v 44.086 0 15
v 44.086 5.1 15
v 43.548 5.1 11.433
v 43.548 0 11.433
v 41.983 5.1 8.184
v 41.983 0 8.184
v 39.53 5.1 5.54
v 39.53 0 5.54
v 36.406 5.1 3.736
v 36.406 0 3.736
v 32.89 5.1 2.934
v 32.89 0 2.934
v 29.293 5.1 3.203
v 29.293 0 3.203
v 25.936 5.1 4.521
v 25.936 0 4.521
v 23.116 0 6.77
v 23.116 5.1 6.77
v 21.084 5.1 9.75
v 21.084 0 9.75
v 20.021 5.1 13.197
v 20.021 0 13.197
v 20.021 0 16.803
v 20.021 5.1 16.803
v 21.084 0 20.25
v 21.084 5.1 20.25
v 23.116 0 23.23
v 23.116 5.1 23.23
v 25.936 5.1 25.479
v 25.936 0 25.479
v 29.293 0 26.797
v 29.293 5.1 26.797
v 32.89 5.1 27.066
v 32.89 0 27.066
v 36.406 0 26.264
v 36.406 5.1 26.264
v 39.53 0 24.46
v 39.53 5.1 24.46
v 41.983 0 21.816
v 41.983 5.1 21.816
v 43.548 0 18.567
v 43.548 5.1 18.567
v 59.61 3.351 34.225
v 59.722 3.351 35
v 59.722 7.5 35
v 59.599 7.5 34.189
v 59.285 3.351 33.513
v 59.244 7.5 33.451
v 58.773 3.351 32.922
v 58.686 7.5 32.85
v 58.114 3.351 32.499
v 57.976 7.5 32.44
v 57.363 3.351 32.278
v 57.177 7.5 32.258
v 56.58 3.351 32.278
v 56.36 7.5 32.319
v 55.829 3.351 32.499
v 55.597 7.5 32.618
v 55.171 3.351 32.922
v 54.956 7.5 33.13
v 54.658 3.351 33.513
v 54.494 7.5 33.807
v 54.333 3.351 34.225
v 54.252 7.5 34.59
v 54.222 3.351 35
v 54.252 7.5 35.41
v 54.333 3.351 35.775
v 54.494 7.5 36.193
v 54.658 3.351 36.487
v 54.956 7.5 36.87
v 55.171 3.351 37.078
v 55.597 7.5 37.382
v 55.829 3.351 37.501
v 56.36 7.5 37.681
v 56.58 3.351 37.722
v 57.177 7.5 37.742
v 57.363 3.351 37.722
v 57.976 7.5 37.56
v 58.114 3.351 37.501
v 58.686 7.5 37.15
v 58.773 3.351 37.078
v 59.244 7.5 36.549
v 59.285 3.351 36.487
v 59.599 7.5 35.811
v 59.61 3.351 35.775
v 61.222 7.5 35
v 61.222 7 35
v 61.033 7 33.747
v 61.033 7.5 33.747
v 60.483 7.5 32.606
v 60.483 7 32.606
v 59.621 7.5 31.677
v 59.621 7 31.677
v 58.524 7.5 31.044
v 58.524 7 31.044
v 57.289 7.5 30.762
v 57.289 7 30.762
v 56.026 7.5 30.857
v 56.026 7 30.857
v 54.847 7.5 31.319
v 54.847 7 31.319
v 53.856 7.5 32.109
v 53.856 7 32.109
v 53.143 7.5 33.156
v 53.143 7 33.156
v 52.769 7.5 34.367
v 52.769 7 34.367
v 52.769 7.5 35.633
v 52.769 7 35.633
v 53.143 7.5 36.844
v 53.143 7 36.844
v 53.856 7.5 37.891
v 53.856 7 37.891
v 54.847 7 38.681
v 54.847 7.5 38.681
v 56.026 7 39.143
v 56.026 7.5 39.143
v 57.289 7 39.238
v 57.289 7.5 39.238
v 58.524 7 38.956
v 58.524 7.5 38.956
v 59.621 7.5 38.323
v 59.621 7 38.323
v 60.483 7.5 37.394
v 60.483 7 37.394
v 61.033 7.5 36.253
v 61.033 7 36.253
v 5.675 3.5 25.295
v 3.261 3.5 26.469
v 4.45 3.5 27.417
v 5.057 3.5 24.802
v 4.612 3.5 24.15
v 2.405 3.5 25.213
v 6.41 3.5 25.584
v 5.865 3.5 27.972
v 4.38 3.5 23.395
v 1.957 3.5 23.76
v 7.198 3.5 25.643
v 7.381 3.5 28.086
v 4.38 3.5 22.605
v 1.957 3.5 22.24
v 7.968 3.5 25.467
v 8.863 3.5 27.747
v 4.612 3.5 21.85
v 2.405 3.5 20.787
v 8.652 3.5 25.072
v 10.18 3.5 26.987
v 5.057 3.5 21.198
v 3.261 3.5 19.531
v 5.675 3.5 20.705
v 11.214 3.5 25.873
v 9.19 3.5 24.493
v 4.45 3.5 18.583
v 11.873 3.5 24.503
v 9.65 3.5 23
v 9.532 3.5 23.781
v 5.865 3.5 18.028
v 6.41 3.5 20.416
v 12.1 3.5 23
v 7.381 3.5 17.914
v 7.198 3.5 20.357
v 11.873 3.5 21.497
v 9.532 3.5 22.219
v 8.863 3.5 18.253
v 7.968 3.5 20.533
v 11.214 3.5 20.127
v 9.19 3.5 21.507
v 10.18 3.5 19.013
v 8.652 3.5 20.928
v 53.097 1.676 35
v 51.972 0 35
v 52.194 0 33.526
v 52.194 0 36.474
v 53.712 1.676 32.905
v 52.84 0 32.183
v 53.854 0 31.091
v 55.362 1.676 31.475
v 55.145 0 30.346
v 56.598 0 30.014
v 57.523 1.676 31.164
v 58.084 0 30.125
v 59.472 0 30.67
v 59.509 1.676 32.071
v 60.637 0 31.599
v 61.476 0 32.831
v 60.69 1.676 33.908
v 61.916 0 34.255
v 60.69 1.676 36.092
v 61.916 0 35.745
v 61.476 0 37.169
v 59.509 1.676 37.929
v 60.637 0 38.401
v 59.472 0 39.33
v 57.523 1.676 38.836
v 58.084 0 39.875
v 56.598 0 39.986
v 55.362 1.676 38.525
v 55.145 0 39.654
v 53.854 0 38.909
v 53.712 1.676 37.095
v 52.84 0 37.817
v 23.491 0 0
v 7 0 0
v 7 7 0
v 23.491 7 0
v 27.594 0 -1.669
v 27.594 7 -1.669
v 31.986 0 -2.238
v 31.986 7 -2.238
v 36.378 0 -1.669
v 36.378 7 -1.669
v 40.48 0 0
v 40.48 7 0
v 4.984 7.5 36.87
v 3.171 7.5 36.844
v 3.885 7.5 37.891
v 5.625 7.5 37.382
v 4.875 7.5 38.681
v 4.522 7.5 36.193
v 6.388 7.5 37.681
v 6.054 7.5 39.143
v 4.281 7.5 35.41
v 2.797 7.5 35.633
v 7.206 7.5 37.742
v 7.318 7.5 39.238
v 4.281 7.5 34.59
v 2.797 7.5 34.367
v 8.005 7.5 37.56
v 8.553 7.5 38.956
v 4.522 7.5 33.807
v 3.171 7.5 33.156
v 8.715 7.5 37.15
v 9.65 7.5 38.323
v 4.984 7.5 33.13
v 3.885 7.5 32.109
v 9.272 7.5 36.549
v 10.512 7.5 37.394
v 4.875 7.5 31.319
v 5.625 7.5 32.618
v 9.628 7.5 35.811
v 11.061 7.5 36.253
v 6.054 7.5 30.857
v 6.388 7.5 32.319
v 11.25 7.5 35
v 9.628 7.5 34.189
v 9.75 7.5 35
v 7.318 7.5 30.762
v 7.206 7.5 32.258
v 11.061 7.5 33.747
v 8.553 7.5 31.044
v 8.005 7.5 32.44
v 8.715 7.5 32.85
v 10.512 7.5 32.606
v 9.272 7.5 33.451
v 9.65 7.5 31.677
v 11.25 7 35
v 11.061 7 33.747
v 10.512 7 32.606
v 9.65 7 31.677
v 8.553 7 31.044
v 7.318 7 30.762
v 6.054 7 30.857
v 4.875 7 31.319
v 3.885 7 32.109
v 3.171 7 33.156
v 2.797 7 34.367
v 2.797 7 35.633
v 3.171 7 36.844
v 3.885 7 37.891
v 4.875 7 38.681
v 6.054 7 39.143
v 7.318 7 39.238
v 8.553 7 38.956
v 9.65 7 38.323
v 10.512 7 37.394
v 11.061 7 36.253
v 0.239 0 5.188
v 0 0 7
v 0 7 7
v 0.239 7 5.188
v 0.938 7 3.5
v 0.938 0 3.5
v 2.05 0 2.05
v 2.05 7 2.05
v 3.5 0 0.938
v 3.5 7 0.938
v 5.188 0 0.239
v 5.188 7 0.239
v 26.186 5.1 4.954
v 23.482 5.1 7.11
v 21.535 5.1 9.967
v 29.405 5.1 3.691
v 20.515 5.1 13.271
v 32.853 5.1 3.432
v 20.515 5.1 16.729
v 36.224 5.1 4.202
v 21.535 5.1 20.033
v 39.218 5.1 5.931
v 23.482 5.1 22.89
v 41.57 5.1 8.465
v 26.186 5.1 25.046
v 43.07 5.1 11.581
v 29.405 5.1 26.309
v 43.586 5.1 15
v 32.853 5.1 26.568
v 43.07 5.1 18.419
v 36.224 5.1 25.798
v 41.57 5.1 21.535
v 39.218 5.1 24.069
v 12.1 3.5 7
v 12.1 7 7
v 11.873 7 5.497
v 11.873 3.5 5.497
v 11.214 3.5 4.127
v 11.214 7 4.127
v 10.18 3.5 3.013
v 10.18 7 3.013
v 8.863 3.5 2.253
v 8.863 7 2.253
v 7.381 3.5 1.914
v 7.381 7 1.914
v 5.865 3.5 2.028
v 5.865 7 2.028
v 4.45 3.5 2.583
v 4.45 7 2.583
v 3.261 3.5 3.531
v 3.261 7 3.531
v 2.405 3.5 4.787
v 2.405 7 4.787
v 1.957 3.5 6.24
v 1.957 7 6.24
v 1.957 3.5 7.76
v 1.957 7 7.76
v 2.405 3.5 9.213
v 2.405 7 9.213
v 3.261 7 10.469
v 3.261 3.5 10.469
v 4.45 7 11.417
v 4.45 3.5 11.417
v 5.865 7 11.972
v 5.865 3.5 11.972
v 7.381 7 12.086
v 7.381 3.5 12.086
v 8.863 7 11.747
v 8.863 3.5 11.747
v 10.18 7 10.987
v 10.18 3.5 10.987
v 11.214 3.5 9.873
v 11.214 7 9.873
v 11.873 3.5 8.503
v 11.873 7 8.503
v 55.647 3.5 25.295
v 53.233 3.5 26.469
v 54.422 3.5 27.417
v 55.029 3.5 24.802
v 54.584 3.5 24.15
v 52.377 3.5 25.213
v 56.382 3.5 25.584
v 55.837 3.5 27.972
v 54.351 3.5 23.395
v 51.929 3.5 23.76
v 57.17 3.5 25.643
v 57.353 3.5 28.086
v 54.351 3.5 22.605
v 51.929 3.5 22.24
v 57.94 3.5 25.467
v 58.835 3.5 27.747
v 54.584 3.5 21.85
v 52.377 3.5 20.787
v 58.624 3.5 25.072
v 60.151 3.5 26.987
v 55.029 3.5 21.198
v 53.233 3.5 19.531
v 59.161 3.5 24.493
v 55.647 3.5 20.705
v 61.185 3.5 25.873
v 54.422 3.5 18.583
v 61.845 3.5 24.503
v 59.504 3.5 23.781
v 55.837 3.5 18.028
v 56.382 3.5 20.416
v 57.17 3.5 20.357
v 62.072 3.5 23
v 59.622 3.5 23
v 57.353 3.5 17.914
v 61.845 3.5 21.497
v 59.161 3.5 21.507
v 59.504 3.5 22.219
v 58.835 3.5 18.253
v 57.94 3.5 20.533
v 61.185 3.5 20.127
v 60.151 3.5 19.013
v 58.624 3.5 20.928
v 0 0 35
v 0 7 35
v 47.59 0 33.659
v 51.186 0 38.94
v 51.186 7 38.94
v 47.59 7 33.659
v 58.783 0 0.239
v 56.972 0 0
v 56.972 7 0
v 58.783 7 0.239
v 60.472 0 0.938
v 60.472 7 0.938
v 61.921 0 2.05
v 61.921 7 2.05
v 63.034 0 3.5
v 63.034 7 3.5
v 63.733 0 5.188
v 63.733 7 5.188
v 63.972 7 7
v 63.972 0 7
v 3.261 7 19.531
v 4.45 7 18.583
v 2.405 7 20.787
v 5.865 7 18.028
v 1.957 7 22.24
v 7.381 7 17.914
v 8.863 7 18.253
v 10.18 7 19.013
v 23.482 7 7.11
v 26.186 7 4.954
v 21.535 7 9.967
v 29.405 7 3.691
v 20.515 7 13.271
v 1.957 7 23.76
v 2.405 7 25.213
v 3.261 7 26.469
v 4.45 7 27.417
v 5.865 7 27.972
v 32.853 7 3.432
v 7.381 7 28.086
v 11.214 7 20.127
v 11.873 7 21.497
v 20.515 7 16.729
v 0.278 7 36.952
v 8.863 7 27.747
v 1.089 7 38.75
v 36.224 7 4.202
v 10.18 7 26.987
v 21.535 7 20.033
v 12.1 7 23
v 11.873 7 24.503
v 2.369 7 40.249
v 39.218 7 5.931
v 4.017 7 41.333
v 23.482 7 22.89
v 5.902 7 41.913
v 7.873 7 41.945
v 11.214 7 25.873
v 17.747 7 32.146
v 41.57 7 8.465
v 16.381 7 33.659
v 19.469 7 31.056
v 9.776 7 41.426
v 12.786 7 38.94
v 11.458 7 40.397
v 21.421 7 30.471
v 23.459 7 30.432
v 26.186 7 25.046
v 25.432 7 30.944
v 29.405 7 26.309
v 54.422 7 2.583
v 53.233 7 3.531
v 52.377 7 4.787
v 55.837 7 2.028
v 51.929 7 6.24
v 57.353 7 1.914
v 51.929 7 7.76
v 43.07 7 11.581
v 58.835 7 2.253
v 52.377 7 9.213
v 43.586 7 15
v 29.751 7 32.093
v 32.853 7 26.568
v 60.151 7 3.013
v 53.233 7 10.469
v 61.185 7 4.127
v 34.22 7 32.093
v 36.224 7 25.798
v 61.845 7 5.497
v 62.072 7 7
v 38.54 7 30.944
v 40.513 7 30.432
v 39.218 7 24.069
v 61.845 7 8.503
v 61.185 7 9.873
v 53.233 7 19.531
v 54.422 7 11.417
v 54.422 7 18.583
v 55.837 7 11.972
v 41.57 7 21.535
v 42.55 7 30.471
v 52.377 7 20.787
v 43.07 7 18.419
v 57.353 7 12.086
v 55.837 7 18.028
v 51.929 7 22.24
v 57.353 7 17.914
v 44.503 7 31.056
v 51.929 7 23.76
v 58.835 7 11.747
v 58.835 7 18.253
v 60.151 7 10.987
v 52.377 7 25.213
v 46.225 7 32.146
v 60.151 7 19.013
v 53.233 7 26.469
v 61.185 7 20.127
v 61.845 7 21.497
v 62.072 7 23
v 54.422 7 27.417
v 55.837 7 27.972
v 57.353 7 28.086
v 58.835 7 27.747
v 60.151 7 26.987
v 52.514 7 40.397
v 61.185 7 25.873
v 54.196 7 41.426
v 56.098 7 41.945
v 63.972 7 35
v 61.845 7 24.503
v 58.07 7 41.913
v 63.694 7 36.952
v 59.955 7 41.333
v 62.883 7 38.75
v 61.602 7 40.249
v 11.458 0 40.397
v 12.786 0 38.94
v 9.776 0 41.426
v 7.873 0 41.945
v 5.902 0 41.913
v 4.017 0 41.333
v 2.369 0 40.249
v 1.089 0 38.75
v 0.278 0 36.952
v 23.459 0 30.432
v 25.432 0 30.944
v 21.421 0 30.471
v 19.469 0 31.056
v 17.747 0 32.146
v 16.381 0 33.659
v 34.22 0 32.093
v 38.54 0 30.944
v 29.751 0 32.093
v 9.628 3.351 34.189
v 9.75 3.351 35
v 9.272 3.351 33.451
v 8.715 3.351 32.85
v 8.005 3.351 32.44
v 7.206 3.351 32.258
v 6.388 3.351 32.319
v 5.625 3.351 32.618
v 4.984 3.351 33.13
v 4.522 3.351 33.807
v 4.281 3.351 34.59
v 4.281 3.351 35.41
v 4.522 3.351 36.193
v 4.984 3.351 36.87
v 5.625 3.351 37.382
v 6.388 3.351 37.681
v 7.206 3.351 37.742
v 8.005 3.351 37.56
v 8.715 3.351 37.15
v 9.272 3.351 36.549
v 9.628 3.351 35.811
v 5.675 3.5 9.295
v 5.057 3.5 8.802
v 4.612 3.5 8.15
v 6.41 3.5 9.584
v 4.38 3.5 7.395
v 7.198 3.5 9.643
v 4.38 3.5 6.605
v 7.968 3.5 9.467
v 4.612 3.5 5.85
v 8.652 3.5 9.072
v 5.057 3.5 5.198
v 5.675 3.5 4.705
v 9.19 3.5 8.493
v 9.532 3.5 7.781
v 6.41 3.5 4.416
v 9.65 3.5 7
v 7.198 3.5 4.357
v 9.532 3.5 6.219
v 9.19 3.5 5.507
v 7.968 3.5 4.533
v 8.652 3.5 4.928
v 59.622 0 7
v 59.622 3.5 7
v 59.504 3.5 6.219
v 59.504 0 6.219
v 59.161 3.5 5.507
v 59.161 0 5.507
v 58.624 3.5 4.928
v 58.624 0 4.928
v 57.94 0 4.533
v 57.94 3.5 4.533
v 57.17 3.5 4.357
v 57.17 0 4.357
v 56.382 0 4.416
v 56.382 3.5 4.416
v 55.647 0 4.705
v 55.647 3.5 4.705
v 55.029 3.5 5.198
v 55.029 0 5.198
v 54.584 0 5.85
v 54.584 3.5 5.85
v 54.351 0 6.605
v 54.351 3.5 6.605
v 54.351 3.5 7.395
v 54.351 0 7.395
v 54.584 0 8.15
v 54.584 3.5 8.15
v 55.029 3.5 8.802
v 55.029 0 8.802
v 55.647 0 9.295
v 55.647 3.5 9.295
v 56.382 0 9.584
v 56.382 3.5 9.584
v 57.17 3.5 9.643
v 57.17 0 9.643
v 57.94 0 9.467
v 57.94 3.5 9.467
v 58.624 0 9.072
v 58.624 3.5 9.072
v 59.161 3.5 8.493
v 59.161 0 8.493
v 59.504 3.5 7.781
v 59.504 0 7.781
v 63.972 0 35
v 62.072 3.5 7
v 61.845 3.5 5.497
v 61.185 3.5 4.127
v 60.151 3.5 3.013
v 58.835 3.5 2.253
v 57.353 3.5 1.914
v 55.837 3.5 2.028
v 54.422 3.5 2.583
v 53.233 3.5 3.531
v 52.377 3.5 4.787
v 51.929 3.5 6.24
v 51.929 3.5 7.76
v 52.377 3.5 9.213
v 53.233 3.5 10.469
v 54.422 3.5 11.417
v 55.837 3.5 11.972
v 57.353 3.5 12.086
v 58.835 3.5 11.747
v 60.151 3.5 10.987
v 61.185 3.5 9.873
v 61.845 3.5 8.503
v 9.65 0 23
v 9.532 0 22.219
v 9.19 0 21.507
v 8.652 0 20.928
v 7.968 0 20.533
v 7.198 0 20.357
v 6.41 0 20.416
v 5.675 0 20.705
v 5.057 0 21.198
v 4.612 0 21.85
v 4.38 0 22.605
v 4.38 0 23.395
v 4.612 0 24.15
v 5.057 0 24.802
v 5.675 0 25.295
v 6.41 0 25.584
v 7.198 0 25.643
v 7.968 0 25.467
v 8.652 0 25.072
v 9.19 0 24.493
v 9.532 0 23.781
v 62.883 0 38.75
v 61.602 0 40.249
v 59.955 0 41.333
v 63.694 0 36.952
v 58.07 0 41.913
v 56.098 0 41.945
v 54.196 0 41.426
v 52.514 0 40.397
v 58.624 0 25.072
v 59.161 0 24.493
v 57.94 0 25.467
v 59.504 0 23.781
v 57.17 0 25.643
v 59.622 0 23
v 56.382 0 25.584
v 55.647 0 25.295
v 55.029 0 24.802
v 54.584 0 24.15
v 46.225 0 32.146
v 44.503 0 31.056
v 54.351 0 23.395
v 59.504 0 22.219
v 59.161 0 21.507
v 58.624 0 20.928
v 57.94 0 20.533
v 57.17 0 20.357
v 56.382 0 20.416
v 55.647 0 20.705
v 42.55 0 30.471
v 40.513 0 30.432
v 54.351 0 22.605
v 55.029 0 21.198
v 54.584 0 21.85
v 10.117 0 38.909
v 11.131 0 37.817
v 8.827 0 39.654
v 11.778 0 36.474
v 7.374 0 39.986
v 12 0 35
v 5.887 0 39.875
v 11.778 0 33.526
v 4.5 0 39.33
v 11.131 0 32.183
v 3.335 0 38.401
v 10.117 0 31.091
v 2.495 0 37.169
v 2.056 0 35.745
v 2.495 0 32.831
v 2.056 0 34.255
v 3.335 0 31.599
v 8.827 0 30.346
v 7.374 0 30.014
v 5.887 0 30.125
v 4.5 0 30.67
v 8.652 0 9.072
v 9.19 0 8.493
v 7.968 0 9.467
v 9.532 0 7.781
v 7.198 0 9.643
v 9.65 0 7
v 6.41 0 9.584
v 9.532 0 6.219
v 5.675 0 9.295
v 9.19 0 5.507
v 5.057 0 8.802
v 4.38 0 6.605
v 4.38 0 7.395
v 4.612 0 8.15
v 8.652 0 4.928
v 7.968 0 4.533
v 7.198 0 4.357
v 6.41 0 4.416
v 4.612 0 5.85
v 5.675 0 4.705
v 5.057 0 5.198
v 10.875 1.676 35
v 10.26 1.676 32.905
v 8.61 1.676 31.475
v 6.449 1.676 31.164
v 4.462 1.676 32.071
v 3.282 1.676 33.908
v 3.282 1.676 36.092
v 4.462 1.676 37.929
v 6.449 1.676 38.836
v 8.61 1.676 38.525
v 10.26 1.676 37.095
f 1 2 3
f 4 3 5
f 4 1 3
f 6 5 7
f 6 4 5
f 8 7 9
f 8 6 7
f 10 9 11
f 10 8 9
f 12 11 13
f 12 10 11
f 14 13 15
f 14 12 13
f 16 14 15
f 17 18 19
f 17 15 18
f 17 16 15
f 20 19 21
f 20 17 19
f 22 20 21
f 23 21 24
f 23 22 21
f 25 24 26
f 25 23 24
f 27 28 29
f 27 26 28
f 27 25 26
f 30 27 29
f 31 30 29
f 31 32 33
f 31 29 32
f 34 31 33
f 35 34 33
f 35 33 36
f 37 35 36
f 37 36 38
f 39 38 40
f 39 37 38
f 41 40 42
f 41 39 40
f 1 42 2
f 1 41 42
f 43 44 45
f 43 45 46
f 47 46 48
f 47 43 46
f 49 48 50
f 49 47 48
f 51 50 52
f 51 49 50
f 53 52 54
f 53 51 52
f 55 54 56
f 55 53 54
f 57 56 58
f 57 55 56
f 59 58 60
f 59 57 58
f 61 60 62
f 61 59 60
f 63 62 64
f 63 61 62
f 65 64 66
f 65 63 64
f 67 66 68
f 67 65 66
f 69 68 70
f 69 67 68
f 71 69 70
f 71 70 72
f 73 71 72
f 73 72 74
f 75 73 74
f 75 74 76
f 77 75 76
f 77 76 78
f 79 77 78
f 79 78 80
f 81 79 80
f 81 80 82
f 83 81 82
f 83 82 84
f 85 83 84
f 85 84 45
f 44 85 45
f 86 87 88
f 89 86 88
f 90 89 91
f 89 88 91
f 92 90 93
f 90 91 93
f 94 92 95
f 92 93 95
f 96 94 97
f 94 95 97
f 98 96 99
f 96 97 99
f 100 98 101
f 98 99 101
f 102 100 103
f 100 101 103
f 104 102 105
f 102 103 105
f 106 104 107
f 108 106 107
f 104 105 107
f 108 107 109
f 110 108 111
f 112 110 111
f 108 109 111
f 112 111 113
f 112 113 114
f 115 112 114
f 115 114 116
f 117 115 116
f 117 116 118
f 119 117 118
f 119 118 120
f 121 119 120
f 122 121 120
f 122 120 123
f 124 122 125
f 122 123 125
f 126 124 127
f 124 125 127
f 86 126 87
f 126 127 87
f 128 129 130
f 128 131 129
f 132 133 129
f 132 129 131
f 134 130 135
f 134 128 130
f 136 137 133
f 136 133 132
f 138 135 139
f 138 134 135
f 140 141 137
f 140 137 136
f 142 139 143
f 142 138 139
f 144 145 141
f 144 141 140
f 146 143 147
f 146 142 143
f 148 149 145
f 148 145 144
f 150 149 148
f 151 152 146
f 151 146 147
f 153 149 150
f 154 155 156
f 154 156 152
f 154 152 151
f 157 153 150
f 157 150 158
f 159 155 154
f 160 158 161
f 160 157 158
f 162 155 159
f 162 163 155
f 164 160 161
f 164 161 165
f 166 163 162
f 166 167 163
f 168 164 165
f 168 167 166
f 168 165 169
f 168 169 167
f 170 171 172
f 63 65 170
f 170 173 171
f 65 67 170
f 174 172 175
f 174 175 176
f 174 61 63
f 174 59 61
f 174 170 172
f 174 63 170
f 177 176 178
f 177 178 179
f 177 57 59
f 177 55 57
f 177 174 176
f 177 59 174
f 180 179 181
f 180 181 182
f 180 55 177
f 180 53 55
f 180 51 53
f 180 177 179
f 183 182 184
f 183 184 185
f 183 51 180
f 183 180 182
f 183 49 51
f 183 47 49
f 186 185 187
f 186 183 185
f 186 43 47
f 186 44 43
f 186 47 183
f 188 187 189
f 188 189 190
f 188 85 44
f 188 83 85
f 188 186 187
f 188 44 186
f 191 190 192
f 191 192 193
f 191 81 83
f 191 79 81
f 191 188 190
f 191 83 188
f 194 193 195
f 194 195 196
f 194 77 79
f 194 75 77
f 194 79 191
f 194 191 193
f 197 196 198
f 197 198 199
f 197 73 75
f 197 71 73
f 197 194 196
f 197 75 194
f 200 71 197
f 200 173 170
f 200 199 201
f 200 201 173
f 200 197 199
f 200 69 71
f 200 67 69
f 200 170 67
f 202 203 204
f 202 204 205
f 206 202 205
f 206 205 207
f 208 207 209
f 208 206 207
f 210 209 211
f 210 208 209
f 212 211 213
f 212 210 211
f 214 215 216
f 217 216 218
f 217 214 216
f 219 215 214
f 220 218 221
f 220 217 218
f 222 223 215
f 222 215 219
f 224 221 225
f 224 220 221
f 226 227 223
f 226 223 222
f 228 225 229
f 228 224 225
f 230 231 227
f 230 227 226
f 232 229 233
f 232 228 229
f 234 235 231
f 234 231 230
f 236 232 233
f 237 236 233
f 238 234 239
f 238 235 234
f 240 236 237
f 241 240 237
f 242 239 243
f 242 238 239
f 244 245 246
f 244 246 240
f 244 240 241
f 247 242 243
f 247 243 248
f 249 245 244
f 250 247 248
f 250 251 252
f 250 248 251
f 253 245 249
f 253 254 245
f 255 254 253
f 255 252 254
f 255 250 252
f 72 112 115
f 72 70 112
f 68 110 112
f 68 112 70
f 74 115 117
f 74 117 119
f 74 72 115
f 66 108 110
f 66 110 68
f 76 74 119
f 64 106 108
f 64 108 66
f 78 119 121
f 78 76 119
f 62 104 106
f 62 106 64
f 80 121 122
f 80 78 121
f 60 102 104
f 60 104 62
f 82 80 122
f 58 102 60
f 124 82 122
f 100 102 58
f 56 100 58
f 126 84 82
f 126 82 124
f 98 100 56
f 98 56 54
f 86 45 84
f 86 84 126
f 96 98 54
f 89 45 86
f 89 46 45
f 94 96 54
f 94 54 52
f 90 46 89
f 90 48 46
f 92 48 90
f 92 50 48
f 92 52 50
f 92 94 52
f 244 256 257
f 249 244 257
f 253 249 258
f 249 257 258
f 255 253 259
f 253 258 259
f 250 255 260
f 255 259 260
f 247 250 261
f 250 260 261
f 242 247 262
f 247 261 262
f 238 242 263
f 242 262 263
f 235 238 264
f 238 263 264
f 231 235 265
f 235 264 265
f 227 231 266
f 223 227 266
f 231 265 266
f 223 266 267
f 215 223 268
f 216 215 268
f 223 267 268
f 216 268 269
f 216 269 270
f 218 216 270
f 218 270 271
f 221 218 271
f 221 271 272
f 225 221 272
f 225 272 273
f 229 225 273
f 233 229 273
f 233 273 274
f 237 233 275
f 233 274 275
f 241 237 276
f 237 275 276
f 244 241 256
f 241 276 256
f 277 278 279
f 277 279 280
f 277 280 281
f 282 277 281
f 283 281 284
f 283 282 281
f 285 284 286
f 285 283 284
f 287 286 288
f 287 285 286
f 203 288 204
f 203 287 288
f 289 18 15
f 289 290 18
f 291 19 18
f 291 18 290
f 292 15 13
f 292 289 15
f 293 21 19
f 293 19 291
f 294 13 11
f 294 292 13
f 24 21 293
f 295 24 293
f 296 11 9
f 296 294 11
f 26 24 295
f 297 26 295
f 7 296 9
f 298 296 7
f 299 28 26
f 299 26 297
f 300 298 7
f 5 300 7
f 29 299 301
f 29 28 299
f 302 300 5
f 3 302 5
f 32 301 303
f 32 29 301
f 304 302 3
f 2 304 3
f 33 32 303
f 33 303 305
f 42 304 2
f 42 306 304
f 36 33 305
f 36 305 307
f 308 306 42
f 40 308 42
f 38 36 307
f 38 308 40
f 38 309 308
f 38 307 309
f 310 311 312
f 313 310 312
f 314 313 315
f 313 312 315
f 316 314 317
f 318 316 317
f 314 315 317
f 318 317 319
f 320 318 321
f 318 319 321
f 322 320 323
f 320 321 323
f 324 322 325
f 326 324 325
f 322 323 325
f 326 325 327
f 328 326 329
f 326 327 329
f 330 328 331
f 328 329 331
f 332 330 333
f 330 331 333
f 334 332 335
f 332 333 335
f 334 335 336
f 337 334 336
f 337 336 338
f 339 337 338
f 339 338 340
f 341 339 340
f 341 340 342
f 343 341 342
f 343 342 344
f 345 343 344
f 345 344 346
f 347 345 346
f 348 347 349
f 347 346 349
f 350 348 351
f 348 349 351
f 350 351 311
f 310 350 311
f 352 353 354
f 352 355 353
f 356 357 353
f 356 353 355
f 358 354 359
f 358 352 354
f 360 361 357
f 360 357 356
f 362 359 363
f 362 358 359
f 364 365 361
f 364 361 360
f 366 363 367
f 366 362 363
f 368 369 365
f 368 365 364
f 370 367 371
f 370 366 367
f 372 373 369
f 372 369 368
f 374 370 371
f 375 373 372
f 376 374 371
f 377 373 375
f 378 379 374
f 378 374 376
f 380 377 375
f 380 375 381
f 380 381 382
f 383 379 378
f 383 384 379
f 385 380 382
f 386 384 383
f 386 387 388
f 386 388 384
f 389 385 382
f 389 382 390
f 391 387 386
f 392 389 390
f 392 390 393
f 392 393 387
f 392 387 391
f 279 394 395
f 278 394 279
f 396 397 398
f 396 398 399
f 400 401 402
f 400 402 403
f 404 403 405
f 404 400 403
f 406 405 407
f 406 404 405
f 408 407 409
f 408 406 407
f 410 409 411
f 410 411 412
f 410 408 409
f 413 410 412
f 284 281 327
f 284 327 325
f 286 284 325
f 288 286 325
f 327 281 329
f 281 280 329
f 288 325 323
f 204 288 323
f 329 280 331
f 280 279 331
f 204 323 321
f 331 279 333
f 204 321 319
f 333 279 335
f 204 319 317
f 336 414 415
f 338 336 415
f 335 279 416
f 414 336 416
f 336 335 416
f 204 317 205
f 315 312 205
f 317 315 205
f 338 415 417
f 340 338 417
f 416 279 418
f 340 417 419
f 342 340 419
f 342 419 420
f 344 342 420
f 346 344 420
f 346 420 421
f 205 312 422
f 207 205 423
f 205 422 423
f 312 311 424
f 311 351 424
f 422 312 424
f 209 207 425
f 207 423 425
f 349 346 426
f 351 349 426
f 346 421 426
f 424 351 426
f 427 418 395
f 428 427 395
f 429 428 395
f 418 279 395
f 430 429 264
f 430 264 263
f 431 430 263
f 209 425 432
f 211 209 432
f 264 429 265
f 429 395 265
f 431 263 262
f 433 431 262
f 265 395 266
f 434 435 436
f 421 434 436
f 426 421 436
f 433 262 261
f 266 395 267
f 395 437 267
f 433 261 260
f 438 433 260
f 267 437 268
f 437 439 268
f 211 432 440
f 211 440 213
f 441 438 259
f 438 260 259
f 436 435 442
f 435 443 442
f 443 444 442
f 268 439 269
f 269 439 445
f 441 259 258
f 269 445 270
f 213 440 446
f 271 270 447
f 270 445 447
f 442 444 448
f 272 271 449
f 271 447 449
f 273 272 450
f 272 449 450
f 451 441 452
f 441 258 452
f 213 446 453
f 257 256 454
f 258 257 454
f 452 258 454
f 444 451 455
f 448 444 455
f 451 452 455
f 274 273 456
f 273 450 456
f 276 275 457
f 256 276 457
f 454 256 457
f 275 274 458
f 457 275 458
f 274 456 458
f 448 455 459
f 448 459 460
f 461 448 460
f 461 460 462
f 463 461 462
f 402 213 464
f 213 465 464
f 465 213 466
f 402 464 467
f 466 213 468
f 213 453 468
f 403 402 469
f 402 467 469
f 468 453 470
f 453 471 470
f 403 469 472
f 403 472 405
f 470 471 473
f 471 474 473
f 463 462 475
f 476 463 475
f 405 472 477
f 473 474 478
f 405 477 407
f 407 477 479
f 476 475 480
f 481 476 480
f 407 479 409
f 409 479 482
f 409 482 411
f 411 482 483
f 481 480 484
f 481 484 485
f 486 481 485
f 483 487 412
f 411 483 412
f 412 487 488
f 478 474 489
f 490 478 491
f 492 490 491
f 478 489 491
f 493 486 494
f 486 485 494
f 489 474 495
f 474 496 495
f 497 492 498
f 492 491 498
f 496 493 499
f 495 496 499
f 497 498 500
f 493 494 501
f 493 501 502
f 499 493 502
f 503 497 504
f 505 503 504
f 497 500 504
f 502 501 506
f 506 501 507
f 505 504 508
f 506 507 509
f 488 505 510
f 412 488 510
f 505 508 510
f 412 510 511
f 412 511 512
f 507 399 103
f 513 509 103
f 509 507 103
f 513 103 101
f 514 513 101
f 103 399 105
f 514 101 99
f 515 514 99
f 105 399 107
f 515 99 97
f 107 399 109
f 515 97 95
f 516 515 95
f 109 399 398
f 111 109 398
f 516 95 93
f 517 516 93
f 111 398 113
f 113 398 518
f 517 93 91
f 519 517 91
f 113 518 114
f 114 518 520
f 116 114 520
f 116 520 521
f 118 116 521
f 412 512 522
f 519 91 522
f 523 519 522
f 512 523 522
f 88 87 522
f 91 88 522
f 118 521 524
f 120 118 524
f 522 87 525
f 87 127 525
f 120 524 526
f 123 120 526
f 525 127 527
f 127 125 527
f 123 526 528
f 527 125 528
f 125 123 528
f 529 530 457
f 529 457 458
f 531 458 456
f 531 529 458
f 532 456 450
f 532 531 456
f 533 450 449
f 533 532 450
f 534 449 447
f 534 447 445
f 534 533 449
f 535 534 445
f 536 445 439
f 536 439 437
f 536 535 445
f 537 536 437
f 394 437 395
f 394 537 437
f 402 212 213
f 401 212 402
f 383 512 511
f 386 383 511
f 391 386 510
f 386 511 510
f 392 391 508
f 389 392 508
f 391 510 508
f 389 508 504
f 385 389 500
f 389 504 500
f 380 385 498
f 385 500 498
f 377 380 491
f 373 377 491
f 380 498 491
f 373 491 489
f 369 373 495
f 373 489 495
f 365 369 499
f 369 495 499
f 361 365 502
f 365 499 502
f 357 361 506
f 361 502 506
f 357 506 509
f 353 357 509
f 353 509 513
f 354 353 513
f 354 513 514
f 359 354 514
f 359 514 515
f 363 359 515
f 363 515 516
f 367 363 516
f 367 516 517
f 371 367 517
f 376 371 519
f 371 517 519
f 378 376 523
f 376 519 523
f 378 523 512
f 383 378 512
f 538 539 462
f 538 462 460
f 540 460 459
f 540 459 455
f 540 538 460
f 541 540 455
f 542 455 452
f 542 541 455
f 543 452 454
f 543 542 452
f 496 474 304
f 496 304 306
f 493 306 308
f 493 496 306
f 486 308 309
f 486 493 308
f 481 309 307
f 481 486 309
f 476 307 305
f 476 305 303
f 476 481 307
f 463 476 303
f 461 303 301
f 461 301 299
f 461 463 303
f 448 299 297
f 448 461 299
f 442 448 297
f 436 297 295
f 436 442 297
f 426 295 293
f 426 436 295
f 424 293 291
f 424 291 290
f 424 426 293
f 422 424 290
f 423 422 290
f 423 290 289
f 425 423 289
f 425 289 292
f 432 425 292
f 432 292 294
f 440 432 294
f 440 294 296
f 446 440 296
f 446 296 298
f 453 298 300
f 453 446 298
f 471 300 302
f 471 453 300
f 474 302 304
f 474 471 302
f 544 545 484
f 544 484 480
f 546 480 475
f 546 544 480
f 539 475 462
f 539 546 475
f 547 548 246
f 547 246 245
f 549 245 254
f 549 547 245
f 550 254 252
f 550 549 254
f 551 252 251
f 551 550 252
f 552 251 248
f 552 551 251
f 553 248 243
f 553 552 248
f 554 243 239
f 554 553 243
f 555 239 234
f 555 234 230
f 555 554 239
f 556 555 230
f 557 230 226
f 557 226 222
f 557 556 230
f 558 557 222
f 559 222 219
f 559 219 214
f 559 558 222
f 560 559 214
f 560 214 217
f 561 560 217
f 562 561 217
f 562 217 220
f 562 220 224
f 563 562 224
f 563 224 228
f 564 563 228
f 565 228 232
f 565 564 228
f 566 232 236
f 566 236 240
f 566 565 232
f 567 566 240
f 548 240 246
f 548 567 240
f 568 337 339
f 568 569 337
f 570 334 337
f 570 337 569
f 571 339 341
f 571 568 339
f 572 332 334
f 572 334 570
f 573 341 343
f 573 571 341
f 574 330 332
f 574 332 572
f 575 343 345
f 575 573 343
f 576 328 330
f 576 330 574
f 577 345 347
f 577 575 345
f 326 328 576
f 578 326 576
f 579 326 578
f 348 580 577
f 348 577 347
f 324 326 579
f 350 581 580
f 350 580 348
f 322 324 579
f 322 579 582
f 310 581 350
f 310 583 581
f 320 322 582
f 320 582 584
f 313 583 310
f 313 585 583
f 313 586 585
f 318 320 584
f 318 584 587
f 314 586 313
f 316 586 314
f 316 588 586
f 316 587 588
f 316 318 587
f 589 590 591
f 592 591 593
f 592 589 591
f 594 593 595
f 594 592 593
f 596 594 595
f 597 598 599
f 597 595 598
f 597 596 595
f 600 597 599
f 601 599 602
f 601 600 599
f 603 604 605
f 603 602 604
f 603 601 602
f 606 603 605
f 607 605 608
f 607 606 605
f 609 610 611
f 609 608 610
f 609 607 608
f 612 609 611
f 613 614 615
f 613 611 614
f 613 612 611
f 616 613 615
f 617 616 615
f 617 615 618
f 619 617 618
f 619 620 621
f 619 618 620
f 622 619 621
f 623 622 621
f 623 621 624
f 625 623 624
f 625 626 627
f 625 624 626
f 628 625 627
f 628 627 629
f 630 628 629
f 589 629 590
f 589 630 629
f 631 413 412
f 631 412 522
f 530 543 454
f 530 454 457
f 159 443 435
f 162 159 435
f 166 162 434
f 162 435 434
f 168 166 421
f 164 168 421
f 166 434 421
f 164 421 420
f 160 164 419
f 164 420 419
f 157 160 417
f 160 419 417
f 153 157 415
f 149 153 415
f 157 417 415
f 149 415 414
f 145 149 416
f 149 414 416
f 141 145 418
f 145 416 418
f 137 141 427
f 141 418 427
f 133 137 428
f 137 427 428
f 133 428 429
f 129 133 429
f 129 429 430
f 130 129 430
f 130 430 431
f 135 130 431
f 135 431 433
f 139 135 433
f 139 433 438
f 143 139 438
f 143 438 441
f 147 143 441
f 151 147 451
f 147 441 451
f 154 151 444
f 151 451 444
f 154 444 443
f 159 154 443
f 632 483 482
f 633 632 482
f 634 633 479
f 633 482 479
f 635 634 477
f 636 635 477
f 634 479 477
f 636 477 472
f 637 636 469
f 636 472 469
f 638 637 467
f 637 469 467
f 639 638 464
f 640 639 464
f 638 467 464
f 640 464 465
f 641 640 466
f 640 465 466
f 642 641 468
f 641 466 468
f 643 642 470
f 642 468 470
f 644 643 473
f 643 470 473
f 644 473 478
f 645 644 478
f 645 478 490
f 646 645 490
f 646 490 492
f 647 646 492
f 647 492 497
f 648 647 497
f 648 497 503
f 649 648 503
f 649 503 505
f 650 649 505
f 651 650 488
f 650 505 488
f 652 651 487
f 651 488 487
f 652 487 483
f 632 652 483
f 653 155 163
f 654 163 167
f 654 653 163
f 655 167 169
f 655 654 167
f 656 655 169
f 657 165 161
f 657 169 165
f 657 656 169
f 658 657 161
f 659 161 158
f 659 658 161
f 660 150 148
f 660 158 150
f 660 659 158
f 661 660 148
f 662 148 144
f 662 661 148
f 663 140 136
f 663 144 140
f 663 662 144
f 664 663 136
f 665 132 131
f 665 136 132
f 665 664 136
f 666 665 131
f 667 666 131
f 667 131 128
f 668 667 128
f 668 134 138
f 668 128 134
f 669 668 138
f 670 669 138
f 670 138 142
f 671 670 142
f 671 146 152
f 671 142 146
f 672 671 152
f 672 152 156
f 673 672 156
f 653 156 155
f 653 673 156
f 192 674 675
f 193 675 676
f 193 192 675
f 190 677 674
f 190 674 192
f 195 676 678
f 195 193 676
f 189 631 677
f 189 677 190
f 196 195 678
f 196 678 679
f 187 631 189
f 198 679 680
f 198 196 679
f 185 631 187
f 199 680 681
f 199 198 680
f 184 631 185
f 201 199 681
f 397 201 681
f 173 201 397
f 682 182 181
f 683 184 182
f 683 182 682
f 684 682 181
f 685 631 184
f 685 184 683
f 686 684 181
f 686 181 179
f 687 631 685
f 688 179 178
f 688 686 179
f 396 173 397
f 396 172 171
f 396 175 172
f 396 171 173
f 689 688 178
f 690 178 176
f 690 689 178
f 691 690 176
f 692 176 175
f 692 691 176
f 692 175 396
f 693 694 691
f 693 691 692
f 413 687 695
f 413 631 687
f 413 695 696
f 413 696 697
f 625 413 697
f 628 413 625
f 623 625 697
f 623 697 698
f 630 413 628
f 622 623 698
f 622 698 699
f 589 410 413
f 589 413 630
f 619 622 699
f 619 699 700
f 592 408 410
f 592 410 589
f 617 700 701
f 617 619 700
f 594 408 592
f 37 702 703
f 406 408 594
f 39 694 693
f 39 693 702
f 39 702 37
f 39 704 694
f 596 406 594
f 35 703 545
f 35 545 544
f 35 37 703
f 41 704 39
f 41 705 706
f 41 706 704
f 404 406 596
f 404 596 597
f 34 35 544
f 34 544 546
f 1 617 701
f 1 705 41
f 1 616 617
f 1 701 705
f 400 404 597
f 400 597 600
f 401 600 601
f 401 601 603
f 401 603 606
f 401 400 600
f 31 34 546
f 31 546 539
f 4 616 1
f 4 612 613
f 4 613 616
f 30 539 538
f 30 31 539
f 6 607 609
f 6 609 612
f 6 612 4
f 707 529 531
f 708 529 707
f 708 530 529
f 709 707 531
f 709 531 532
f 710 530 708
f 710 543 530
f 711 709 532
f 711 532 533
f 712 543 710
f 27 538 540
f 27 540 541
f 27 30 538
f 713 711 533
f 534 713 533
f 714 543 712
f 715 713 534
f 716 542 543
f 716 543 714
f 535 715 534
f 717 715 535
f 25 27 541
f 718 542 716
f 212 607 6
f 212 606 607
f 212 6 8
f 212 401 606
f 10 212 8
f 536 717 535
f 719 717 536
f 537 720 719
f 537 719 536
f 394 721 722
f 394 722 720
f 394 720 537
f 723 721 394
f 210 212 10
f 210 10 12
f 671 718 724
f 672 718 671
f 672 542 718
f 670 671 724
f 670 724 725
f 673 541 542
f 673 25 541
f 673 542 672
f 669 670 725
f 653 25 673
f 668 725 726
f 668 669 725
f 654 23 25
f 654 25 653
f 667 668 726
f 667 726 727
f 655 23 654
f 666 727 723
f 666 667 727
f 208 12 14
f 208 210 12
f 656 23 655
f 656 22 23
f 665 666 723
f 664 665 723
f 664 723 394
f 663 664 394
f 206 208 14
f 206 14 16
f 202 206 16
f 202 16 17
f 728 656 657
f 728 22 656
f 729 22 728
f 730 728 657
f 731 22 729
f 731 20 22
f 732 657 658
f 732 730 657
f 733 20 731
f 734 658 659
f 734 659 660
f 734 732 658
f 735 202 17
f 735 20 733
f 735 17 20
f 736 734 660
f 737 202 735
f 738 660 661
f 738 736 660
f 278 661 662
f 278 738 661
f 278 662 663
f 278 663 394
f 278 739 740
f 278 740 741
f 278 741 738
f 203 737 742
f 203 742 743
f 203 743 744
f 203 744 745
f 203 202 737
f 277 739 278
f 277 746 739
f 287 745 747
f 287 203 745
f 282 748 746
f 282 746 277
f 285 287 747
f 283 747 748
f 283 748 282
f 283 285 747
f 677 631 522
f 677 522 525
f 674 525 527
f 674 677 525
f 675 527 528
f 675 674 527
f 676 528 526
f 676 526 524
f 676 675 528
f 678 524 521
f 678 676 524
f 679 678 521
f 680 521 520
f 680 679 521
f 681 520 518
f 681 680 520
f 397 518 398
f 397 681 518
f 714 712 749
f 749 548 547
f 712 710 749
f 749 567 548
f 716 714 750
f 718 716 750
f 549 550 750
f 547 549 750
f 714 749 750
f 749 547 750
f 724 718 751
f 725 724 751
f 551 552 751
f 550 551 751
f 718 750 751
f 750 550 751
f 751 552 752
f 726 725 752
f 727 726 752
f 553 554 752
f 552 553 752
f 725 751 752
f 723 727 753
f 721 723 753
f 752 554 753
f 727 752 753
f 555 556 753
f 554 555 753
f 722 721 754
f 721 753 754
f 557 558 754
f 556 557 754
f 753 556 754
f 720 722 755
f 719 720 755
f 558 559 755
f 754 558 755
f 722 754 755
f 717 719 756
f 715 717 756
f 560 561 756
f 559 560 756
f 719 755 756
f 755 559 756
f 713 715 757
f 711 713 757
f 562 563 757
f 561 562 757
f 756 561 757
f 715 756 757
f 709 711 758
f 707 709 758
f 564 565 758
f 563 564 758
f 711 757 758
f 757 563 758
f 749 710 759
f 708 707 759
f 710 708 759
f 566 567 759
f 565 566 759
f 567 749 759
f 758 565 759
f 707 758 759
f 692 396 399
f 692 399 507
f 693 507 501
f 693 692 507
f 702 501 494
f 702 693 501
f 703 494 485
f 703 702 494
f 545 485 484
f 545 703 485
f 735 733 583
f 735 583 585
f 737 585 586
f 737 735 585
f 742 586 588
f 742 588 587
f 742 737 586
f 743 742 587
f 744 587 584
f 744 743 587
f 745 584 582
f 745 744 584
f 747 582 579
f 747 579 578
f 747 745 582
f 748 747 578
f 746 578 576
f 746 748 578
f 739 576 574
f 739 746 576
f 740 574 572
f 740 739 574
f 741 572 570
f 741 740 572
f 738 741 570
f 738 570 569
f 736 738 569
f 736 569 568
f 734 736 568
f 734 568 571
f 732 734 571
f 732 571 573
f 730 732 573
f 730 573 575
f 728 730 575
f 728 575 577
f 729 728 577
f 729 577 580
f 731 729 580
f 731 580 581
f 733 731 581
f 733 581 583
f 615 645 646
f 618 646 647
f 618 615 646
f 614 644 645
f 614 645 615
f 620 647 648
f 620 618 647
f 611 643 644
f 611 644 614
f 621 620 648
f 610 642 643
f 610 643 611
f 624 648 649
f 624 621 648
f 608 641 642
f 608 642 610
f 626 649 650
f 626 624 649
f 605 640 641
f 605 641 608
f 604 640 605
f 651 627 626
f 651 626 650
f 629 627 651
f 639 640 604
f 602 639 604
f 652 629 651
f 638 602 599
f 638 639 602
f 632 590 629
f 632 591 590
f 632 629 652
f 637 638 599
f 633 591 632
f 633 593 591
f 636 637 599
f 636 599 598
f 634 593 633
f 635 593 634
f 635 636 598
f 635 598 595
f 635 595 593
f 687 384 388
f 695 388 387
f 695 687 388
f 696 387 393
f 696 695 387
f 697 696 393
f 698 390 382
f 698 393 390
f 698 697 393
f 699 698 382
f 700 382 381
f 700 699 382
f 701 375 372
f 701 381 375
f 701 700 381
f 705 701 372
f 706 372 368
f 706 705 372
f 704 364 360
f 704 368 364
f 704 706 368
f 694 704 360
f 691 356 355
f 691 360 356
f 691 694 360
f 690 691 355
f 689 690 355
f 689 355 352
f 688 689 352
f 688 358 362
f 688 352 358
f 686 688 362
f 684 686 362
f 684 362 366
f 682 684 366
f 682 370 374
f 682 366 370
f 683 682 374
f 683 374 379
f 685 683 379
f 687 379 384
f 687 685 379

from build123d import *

# Parameters (mm, degrees)
SKETCH_1_R          = 2.65
SKETCH_1_R_2        = 2.75
SKETCH_1_R_3        = 12.1
EXTRUDE_1_DEPTH     = 7
EXTRUDE_START       = -7
SKETCH_2_R          = 12.1
SKETCH_2_R_2        = 11.6
EXTRUDE_2_DEPTH     = 1.9
SKETCH_3_R          = 5.1
SKETCH_3_R_2        = 2.65
CUT_EXTRUDE_1_DEPTH = 3.5
SKETCH_4_R          = 4.25
SKETCH_4_R_2        = 2.75
EXTRUDE_3_DEPTH     = 0.5


with BuildPart() as part:
    # 草图1 → 凸台-拉伸1 (new body)
    with BuildSketch(Plane(origin=(0, 0, 0), x_dir=(1, 0, 0), z_dir=(0, 1, 0))):
        with BuildLine():
            Line((40.480150219, 0), (56.971640332, 0))
            ThreePointArc((56.971640332, 0), (61.9213878, -2.050252532), (63.971640332, -7))
            Line((63.971640332, -7), (63.971640332, -35))
            ThreePointArc((63.971640332, -35), (59.032841716, -41.689652372), (51.185512088, -38.939634494))
            Line((51.185512088, -38.939634494), (47.590395779, -33.659498976))
            ThreePointArc((47.590395779, -33.659498976), (43.546468384, -30.69695478), (38.539560652, -30.94371753))
            ThreePointArc((38.539560652, -30.94371753), (31.985820166, -32.238145), (25.43207968, -30.94371753))
            ThreePointArc((25.43207968, -30.94371753), (20.425171948, -30.69695478), (16.381244554, -33.659498976))
            Line((16.381244554, -33.659498976), (12.786128244, -38.939634494))
            ThreePointArc((12.786128244, -38.939634494), (4.938798616, -41.689652372), (0, -35))
            Line((0, -35), (0, -7))
            ThreePointArc((0, -7), (2.050252532, -2.050252532), (7, 0))
            Line((7, 0), (23.491490114, 0))
            ThreePointArc((23.491490114, 0), (31.985820166, 2.238145), (40.480150219, 0))
        make_face()
        with Locations((56.971640332, -7)):
            Circle(SKETCH_1_R, mode=Mode.SUBTRACT)
        with Locations((56.971640332, -35)):
            Circle(SKETCH_1_R_2, mode=Mode.SUBTRACT)
        with Locations((7, -23)):
            Circle(SKETCH_1_R, mode=Mode.SUBTRACT)
        with Locations((7, -7)):
            Circle(SKETCH_1_R, mode=Mode.SUBTRACT)
        with Locations((7, -35)):
            Circle(SKETCH_1_R_2, mode=Mode.SUBTRACT)
        with Locations((56.971640332, -23)):
            Circle(SKETCH_1_R, mode=Mode.SUBTRACT)
        with Locations((31.985820166, -15)):
            Circle(SKETCH_1_R_3, mode=Mode.SUBTRACT)
    extrude(amount=EXTRUDE_1_DEPTH)

    # 草图2 → 凸台-拉伸2 (add)
    with BuildSketch(Plane.XZ.offset(EXTRUDE_START)):
        with Locations((31.985820166, 15)):
            Circle(SKETCH_2_R)
        with Locations((31.985820166, 15)):
            Circle(SKETCH_2_R_2, mode=Mode.SUBTRACT)
    extrude(amount=EXTRUDE_2_DEPTH)

    # 草图3 → 切除-拉伸1 (cut)
    with BuildSketch(Plane(origin=(0, 7, 0), x_dir=(1, 0, 0), z_dir=(0, 1, 0))):
        with Locations((56.971640332, -7)):
            Circle(SKETCH_3_R)
        with Locations((56.971640332, -23)):
            Circle(SKETCH_3_R)
        with Locations((7, -23)):
            Circle(SKETCH_3_R)
        with Locations((7, -7)):
            Circle(SKETCH_3_R)
        with Locations((7, -7)):
            Circle(SKETCH_3_R_2, mode=Mode.SUBTRACT)
    extrude(amount=-CUT_EXTRUDE_1_DEPTH, mode=Mode.SUBTRACT)

    # 草图4 → 凸台-拉伸3 (add)
    with BuildSketch(Plane(origin=(0, 7, 0), x_dir=(1, 0, 0), z_dir=(0, 1, 0))):
        with Locations((7, -35)):
            Circle(SKETCH_4_R)
        with Locations((7, -35)):
            Circle(SKETCH_4_R_2, mode=Mode.SUBTRACT)
        with Locations((56.971640332, -35)):
            Circle(SKETCH_4_R)
        with Locations((56.971640332, -35)):
            Circle(SKETCH_4_R_2, mode=Mode.SUBTRACT)
    extrude(amount=EXTRUDE_3_DEPTH)

    # 草图5 → 切除-旋转1 (revolve, cut)
    with BuildSketch(Plane.XY.offset(35)):
        Polygon((12, 0), (9.65, 3.5), (7, 3.5), (7, 0), align=None)
    cut_revolve_1 = revolve(axis=Axis((7, 0, 35), (0, 1, 0)), mode=Mode.SUBTRACT)

    # 镜向1: 切除-旋转1 across plane
    add(cut_revolve_1.mirror(Plane.ZY.offset(-31.985820166)), mode=Mode.SUBTRACT)


solid = part.part
